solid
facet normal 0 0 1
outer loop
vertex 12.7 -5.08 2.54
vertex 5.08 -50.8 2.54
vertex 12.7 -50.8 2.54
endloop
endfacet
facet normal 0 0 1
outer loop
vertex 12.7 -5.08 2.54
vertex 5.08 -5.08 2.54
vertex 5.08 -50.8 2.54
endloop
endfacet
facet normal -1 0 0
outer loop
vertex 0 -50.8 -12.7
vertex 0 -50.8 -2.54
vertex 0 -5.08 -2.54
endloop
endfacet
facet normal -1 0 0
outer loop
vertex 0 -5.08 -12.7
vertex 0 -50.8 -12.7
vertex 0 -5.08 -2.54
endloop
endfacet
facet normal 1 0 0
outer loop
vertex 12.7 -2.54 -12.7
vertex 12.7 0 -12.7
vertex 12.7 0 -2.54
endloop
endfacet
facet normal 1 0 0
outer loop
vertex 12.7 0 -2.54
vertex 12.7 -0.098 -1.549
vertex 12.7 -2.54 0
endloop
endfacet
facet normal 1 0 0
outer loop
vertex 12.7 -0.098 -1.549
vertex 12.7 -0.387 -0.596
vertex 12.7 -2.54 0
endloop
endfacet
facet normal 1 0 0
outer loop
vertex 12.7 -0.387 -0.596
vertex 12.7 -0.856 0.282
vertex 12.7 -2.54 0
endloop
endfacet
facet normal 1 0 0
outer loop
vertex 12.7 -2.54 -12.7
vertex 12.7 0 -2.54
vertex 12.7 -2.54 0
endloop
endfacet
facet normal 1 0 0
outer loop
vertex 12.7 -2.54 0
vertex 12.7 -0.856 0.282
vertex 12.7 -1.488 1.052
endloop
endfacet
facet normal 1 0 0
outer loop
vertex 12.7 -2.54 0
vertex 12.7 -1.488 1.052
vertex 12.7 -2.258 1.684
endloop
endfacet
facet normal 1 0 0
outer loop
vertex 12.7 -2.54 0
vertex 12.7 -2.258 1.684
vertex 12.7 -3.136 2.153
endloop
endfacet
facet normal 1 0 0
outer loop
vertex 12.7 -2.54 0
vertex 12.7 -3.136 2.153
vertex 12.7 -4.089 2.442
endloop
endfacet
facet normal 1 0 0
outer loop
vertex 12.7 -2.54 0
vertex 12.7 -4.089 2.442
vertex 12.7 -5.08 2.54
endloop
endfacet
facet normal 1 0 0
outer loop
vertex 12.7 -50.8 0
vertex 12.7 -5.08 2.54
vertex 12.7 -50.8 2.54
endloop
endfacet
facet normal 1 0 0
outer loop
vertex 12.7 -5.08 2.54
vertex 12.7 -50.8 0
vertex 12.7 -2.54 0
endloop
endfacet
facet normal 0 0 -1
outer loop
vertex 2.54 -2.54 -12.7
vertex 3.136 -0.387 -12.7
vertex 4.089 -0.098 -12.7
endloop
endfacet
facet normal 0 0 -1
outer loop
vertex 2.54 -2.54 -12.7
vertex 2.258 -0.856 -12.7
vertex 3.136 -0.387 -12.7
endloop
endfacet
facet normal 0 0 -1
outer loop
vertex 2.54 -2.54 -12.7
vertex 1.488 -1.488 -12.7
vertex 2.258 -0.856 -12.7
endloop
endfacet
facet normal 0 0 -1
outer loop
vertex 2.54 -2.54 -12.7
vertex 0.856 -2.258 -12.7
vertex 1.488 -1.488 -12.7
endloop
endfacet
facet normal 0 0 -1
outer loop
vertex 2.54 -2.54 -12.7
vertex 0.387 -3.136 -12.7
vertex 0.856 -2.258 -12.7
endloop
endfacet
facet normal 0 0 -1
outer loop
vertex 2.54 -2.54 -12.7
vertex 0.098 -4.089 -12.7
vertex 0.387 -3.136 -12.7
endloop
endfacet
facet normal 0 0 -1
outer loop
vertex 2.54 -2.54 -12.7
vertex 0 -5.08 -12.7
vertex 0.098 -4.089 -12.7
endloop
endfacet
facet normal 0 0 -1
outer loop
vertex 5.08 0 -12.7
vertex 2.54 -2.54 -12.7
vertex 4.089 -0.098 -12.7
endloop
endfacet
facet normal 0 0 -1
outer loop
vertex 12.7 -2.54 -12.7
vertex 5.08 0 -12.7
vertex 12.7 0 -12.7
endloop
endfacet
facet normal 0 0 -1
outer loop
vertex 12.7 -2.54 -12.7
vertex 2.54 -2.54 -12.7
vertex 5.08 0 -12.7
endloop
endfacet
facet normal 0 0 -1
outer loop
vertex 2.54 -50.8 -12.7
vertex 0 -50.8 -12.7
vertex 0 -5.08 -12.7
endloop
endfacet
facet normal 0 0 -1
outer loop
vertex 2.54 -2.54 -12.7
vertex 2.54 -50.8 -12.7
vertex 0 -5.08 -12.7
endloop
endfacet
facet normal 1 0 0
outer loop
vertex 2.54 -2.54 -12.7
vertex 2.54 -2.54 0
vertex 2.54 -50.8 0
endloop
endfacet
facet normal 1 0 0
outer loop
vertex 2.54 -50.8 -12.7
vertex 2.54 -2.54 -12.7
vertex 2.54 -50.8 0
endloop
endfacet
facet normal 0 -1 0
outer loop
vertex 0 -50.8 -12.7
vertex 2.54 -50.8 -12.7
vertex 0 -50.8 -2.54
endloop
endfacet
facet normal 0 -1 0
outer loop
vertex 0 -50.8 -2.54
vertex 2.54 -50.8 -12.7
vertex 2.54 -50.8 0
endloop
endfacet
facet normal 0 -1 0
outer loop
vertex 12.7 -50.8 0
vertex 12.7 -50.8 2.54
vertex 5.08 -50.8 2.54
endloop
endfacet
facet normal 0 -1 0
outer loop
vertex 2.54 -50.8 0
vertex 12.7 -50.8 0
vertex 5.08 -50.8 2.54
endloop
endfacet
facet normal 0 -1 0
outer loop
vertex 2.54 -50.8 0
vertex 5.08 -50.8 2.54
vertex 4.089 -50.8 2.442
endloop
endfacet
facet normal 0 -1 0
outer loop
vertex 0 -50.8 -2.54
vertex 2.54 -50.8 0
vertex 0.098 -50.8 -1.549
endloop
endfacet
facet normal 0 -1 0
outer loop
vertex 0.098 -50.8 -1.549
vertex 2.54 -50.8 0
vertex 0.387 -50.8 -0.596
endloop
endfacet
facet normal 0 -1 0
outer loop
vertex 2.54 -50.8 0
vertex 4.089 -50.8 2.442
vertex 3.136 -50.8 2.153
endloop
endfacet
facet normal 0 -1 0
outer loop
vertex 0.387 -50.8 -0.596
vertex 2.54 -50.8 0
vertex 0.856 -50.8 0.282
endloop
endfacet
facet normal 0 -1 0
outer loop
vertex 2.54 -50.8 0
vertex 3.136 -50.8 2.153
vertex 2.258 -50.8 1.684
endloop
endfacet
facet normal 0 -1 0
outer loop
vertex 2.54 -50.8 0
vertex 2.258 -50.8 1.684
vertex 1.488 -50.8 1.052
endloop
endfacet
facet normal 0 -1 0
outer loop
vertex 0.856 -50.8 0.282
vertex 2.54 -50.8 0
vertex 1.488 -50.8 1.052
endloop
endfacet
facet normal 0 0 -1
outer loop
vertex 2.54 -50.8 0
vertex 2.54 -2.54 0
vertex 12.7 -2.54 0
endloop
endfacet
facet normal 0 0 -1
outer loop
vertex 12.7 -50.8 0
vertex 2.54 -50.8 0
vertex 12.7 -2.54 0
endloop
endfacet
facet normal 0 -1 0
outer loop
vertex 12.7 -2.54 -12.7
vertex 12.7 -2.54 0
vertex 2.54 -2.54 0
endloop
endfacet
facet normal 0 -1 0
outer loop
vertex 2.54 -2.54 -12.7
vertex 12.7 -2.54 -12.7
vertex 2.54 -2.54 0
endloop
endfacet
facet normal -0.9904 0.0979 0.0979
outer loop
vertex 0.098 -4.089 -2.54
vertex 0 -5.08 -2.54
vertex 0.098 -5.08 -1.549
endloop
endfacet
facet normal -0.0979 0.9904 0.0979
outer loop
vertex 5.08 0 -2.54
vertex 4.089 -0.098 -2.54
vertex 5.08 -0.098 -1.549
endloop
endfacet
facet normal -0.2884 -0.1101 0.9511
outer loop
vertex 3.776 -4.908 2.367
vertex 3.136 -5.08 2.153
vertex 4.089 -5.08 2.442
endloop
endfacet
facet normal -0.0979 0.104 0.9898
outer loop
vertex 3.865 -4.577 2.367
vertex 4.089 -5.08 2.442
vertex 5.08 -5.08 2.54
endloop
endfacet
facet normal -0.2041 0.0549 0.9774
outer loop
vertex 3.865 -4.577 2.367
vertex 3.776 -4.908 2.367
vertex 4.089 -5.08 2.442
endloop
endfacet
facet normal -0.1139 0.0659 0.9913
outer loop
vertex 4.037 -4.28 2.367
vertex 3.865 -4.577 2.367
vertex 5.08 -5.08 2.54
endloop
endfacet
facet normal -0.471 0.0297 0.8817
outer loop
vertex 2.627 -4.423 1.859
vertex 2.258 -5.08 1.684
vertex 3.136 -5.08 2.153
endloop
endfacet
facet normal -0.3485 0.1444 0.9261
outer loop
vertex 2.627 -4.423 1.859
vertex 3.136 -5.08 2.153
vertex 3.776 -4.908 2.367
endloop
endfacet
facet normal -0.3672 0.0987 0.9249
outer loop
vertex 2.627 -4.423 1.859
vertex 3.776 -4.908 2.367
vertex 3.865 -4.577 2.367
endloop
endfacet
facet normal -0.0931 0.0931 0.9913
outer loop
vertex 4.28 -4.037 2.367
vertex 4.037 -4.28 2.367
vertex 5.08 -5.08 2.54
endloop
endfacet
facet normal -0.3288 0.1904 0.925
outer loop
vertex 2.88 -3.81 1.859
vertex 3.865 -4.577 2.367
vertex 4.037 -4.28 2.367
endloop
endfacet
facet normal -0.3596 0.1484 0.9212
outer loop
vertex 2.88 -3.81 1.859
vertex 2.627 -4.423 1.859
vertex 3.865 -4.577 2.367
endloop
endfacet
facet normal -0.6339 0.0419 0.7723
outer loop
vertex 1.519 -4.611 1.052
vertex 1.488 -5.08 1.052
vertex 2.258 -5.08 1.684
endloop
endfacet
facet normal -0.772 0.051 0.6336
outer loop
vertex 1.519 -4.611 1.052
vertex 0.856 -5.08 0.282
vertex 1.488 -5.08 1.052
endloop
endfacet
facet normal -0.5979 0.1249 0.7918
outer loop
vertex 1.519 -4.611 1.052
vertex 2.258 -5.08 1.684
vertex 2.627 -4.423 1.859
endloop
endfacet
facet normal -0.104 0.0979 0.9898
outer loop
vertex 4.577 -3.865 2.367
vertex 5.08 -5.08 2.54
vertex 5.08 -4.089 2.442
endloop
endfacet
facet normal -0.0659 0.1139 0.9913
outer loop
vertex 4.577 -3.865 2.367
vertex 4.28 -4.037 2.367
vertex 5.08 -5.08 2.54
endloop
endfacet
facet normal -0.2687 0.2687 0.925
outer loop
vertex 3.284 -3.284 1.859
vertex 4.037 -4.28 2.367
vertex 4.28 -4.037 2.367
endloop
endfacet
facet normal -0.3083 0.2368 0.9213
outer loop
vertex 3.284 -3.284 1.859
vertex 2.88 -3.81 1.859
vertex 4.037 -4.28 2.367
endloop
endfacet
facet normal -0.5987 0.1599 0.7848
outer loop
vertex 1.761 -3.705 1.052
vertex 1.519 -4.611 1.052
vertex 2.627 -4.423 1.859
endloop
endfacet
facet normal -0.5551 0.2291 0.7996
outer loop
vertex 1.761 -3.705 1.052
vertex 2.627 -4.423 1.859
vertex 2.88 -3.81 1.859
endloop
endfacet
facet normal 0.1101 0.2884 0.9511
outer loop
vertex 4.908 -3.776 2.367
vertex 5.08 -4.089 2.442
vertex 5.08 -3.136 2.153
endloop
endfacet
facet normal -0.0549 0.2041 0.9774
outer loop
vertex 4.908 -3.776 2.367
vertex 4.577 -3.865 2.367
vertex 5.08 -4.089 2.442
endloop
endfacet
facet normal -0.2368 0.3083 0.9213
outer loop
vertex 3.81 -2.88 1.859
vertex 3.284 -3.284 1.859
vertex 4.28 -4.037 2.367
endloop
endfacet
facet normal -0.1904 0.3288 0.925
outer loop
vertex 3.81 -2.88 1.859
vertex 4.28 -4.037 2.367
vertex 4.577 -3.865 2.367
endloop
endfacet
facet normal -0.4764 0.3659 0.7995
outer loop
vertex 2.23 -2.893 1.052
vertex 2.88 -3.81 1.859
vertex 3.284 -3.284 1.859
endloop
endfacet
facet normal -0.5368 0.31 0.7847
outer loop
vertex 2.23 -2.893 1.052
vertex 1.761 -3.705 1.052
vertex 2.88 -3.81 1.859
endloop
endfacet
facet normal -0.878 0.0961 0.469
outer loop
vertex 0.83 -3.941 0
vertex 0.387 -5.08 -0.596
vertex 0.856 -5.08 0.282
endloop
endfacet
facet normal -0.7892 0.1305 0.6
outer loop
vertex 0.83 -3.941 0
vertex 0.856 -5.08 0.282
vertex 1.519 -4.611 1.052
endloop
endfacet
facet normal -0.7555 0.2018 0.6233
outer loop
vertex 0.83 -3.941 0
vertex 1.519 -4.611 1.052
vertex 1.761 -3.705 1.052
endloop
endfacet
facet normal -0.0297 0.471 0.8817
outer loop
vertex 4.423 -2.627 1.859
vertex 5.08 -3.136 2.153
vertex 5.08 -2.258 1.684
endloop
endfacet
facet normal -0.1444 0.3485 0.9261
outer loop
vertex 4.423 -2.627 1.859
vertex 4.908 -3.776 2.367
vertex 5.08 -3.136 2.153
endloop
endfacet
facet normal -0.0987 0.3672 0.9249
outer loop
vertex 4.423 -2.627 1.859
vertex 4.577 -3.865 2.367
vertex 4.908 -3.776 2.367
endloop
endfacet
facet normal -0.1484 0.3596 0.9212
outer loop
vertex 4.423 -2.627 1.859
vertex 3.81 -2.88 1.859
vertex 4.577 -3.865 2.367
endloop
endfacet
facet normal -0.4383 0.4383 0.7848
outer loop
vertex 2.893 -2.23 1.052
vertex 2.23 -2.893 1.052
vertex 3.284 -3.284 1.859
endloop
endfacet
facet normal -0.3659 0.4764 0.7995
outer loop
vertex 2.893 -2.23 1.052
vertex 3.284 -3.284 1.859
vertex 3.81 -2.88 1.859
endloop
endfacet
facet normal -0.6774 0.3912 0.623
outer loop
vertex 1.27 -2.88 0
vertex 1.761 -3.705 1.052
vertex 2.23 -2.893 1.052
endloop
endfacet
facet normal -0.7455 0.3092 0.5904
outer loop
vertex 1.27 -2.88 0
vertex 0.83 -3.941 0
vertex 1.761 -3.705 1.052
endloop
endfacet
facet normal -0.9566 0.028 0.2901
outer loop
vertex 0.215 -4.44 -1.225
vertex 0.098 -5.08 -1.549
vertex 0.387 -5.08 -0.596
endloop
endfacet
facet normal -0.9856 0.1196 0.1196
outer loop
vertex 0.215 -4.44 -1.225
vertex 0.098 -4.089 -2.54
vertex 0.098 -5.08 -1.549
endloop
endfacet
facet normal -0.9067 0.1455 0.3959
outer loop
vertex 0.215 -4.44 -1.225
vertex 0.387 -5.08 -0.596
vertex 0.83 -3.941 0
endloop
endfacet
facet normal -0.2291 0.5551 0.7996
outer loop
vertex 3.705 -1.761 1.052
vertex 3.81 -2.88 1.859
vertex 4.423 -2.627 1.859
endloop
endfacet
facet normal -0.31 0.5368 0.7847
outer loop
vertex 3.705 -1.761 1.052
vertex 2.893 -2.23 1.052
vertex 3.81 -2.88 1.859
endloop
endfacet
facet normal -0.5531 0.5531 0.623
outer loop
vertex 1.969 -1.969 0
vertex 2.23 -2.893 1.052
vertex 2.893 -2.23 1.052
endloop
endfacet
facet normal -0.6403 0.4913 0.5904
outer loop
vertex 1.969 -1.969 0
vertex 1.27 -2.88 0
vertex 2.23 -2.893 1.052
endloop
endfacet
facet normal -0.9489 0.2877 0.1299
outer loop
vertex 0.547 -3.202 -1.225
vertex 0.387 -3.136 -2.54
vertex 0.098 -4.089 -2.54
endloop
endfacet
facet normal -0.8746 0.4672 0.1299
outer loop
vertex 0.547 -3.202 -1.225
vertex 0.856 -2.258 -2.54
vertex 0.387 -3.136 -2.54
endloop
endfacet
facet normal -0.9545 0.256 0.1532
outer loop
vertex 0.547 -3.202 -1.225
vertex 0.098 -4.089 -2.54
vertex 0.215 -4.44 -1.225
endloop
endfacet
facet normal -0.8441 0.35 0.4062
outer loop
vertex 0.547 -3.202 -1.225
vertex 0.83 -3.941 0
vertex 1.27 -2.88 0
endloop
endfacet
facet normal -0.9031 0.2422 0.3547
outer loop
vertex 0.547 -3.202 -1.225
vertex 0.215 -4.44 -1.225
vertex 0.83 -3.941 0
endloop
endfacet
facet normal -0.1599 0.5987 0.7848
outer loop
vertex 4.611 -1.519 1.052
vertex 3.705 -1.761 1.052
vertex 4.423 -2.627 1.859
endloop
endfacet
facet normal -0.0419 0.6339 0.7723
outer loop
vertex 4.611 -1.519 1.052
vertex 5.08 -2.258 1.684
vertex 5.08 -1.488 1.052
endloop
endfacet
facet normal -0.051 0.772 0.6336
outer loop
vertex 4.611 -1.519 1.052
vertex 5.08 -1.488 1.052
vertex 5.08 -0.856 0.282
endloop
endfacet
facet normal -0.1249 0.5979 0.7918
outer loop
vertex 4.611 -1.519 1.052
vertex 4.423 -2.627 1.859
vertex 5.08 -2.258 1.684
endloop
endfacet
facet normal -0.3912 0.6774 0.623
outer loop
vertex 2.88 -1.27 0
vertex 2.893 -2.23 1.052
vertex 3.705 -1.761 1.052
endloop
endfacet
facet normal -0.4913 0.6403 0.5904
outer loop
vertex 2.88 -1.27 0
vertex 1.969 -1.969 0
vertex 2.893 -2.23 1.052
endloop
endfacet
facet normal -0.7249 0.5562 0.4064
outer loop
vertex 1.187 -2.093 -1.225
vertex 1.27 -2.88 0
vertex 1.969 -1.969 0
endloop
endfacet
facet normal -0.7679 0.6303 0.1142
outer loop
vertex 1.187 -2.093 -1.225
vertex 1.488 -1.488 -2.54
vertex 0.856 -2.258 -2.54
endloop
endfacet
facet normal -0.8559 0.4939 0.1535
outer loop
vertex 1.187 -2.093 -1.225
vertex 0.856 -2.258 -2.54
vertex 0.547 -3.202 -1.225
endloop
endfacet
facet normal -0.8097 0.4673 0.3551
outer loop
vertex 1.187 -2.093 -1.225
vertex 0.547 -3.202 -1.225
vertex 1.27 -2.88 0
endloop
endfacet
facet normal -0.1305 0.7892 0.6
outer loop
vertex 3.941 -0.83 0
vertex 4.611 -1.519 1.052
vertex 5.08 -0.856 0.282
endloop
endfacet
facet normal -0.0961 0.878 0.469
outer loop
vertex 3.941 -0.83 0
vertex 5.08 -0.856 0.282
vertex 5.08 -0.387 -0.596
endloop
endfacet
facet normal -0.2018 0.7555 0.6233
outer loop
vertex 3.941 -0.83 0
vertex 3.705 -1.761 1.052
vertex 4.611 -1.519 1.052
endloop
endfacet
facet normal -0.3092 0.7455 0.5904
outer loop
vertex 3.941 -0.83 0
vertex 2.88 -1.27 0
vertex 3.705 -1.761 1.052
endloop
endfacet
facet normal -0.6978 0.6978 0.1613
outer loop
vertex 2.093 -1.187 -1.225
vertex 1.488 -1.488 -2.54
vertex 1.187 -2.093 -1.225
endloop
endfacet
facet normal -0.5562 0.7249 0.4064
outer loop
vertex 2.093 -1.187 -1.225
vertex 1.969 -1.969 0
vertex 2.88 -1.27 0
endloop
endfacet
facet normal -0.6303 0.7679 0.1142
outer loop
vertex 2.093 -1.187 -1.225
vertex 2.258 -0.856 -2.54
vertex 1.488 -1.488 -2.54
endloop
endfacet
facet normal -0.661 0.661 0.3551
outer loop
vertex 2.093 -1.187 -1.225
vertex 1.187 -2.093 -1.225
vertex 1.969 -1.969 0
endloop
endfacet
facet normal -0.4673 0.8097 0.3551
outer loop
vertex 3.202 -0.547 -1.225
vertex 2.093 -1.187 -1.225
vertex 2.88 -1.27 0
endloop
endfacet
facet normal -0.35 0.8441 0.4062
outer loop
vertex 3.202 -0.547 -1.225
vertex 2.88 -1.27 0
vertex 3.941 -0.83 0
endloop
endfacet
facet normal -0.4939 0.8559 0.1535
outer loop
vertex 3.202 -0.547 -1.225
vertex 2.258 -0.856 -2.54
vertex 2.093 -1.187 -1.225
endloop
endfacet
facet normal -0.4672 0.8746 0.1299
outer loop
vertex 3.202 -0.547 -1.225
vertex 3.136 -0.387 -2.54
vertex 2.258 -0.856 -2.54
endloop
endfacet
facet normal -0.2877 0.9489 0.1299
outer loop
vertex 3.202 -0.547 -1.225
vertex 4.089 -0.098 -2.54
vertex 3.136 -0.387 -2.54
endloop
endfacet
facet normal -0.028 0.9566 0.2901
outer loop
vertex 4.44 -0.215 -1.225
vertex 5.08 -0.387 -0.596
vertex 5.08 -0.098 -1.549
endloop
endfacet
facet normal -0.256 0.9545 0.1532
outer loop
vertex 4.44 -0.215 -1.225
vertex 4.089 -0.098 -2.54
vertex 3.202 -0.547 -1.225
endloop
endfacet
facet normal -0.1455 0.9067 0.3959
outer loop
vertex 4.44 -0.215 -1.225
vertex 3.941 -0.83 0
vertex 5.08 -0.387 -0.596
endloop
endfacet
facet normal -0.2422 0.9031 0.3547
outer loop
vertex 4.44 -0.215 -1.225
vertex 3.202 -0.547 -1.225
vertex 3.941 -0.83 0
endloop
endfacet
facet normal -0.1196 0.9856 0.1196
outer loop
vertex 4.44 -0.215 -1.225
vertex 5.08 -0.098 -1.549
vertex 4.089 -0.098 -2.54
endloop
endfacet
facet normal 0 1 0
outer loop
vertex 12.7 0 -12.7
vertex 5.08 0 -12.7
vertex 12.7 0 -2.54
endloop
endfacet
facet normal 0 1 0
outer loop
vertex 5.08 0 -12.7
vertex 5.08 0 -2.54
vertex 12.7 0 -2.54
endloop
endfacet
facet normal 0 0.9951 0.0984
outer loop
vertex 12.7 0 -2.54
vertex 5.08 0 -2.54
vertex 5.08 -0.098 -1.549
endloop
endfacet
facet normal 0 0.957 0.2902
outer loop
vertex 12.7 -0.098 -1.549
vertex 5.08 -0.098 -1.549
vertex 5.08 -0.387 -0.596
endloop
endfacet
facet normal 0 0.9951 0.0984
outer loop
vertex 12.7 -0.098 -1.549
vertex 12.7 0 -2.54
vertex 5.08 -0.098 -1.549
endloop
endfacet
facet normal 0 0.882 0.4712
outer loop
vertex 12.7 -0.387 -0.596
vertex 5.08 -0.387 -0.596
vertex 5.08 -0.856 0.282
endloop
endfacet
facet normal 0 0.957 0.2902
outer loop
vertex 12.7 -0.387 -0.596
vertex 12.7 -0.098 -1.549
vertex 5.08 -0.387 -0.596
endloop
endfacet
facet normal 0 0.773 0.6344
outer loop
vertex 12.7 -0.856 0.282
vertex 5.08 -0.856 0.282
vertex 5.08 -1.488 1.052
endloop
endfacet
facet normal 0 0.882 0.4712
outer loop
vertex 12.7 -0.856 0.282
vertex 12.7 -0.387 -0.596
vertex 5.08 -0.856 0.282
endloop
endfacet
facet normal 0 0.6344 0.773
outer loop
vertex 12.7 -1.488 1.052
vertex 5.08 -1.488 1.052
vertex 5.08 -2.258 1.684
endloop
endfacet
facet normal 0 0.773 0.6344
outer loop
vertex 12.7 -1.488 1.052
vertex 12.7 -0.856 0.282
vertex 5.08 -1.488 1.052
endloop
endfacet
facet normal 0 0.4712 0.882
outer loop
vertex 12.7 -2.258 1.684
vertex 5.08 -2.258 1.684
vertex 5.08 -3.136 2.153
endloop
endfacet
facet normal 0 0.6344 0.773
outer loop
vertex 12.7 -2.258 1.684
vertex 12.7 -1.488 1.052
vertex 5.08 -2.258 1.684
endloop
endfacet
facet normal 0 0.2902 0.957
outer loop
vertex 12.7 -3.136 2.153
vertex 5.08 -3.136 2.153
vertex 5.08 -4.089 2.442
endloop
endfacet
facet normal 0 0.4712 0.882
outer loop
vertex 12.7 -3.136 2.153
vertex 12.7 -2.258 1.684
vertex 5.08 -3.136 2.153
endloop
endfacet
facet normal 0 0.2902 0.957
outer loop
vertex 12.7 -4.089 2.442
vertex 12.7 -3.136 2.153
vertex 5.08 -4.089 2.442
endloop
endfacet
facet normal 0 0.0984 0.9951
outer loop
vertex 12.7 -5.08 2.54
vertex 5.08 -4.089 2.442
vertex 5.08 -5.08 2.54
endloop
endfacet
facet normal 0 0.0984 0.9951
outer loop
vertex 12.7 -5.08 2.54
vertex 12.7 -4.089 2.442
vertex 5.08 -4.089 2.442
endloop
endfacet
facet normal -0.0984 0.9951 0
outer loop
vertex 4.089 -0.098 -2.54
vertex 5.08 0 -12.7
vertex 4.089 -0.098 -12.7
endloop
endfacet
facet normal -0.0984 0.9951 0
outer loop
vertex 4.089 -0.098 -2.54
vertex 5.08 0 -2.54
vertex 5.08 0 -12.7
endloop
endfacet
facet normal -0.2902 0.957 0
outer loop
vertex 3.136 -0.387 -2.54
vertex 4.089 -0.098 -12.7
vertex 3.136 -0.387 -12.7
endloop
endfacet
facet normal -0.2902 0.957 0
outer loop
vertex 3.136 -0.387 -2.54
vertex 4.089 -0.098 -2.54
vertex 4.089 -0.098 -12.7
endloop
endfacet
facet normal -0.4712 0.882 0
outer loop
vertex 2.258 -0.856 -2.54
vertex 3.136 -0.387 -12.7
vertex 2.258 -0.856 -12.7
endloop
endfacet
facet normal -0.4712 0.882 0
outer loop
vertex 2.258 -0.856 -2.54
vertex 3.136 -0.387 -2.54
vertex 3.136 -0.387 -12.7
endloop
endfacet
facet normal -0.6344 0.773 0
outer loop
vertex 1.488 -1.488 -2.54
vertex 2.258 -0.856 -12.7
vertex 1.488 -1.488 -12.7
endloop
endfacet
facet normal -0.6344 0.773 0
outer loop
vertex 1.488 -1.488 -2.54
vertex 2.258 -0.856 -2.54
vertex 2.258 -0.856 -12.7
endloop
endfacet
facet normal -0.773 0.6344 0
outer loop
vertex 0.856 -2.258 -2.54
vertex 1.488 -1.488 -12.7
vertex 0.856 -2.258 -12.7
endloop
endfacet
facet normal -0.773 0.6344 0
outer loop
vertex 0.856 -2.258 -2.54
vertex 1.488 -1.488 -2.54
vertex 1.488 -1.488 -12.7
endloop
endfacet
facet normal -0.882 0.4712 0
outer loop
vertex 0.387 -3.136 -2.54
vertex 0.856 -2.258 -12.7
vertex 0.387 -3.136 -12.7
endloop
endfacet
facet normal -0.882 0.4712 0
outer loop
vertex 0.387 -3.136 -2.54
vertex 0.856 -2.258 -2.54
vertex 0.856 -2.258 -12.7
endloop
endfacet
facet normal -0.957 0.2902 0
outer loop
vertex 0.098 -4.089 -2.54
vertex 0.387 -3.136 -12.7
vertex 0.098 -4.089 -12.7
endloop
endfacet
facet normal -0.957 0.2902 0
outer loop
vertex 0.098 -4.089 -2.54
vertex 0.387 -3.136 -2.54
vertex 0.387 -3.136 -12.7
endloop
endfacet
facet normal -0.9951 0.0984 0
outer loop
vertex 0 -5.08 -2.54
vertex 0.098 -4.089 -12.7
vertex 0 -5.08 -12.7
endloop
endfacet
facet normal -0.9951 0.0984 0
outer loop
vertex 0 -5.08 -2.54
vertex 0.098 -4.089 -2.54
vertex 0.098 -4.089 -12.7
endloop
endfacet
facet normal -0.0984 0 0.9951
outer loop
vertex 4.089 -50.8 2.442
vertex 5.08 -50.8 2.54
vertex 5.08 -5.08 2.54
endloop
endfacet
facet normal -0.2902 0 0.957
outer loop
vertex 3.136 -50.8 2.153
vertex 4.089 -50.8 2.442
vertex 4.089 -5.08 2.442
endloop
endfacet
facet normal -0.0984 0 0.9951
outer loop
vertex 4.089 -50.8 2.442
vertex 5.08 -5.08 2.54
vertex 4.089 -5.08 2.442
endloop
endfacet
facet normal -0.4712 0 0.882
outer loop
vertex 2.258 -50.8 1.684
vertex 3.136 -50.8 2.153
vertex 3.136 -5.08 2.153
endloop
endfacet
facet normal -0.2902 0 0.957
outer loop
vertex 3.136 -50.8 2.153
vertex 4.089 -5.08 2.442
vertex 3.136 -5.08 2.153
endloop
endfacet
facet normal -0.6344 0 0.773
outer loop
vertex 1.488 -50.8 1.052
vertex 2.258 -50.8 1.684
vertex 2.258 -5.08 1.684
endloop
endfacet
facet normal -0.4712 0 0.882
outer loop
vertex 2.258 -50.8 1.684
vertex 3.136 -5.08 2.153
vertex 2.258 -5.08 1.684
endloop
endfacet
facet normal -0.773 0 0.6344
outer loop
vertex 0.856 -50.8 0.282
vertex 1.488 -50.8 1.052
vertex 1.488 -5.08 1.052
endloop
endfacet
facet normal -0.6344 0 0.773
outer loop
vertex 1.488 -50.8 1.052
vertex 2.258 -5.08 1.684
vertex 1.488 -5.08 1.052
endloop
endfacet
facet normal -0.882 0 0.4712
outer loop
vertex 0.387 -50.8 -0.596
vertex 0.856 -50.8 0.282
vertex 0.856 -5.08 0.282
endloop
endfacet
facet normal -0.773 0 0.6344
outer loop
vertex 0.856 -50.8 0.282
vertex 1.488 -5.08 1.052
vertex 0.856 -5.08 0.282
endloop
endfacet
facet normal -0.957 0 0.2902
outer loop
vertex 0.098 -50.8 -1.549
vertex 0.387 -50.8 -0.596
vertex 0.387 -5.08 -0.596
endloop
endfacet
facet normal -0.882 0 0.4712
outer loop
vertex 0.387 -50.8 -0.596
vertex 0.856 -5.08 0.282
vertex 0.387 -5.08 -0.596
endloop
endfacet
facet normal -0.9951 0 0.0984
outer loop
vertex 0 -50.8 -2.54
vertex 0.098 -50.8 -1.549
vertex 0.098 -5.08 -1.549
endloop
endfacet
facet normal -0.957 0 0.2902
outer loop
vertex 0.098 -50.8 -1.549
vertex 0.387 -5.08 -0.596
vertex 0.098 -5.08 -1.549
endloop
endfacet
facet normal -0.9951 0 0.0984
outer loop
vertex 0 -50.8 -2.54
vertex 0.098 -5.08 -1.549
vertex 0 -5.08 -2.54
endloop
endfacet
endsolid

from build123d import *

# Parameters (mm, degrees)
F0_W     = 12.7
F0_H     = 50.8
F1_DEPTH = 2.54
F3_DEPTH = 12.7
F4_R     = 5.08


with BuildPart() as f1:
    # F0 (on Top) → F1 (new body)
    with BuildSketch(Plane.XY):
        with Locations((6.35, -25.4)):
            Rectangle(F0_W, F0_H)
    extrude(amount=F1_DEPTH)

    # F2 (on face) → F3 (join)
    with BuildSketch(Plane(origin=(0, 0, 0), x_dir=(1, 0, 0), z_dir=(0, 0, -1))):
        Polygon((0, 0), (12.7, 0), (12.7, 2.54), (2.54, 2.54), (2.54, 50.8), (0, 50.8), align=None)
    extrude(amount=F3_DEPTH)

    # F4
    f4_edges = [f1.edges().sort_by_distance(p)[0] for p in [
        (0, 0, -5.08),
        (0, -25.4, 2.54),
        (6.35, 0, 2.54),
    ]]
    fillet(f4_edges, radius=F4_R)


solid = f1.part
